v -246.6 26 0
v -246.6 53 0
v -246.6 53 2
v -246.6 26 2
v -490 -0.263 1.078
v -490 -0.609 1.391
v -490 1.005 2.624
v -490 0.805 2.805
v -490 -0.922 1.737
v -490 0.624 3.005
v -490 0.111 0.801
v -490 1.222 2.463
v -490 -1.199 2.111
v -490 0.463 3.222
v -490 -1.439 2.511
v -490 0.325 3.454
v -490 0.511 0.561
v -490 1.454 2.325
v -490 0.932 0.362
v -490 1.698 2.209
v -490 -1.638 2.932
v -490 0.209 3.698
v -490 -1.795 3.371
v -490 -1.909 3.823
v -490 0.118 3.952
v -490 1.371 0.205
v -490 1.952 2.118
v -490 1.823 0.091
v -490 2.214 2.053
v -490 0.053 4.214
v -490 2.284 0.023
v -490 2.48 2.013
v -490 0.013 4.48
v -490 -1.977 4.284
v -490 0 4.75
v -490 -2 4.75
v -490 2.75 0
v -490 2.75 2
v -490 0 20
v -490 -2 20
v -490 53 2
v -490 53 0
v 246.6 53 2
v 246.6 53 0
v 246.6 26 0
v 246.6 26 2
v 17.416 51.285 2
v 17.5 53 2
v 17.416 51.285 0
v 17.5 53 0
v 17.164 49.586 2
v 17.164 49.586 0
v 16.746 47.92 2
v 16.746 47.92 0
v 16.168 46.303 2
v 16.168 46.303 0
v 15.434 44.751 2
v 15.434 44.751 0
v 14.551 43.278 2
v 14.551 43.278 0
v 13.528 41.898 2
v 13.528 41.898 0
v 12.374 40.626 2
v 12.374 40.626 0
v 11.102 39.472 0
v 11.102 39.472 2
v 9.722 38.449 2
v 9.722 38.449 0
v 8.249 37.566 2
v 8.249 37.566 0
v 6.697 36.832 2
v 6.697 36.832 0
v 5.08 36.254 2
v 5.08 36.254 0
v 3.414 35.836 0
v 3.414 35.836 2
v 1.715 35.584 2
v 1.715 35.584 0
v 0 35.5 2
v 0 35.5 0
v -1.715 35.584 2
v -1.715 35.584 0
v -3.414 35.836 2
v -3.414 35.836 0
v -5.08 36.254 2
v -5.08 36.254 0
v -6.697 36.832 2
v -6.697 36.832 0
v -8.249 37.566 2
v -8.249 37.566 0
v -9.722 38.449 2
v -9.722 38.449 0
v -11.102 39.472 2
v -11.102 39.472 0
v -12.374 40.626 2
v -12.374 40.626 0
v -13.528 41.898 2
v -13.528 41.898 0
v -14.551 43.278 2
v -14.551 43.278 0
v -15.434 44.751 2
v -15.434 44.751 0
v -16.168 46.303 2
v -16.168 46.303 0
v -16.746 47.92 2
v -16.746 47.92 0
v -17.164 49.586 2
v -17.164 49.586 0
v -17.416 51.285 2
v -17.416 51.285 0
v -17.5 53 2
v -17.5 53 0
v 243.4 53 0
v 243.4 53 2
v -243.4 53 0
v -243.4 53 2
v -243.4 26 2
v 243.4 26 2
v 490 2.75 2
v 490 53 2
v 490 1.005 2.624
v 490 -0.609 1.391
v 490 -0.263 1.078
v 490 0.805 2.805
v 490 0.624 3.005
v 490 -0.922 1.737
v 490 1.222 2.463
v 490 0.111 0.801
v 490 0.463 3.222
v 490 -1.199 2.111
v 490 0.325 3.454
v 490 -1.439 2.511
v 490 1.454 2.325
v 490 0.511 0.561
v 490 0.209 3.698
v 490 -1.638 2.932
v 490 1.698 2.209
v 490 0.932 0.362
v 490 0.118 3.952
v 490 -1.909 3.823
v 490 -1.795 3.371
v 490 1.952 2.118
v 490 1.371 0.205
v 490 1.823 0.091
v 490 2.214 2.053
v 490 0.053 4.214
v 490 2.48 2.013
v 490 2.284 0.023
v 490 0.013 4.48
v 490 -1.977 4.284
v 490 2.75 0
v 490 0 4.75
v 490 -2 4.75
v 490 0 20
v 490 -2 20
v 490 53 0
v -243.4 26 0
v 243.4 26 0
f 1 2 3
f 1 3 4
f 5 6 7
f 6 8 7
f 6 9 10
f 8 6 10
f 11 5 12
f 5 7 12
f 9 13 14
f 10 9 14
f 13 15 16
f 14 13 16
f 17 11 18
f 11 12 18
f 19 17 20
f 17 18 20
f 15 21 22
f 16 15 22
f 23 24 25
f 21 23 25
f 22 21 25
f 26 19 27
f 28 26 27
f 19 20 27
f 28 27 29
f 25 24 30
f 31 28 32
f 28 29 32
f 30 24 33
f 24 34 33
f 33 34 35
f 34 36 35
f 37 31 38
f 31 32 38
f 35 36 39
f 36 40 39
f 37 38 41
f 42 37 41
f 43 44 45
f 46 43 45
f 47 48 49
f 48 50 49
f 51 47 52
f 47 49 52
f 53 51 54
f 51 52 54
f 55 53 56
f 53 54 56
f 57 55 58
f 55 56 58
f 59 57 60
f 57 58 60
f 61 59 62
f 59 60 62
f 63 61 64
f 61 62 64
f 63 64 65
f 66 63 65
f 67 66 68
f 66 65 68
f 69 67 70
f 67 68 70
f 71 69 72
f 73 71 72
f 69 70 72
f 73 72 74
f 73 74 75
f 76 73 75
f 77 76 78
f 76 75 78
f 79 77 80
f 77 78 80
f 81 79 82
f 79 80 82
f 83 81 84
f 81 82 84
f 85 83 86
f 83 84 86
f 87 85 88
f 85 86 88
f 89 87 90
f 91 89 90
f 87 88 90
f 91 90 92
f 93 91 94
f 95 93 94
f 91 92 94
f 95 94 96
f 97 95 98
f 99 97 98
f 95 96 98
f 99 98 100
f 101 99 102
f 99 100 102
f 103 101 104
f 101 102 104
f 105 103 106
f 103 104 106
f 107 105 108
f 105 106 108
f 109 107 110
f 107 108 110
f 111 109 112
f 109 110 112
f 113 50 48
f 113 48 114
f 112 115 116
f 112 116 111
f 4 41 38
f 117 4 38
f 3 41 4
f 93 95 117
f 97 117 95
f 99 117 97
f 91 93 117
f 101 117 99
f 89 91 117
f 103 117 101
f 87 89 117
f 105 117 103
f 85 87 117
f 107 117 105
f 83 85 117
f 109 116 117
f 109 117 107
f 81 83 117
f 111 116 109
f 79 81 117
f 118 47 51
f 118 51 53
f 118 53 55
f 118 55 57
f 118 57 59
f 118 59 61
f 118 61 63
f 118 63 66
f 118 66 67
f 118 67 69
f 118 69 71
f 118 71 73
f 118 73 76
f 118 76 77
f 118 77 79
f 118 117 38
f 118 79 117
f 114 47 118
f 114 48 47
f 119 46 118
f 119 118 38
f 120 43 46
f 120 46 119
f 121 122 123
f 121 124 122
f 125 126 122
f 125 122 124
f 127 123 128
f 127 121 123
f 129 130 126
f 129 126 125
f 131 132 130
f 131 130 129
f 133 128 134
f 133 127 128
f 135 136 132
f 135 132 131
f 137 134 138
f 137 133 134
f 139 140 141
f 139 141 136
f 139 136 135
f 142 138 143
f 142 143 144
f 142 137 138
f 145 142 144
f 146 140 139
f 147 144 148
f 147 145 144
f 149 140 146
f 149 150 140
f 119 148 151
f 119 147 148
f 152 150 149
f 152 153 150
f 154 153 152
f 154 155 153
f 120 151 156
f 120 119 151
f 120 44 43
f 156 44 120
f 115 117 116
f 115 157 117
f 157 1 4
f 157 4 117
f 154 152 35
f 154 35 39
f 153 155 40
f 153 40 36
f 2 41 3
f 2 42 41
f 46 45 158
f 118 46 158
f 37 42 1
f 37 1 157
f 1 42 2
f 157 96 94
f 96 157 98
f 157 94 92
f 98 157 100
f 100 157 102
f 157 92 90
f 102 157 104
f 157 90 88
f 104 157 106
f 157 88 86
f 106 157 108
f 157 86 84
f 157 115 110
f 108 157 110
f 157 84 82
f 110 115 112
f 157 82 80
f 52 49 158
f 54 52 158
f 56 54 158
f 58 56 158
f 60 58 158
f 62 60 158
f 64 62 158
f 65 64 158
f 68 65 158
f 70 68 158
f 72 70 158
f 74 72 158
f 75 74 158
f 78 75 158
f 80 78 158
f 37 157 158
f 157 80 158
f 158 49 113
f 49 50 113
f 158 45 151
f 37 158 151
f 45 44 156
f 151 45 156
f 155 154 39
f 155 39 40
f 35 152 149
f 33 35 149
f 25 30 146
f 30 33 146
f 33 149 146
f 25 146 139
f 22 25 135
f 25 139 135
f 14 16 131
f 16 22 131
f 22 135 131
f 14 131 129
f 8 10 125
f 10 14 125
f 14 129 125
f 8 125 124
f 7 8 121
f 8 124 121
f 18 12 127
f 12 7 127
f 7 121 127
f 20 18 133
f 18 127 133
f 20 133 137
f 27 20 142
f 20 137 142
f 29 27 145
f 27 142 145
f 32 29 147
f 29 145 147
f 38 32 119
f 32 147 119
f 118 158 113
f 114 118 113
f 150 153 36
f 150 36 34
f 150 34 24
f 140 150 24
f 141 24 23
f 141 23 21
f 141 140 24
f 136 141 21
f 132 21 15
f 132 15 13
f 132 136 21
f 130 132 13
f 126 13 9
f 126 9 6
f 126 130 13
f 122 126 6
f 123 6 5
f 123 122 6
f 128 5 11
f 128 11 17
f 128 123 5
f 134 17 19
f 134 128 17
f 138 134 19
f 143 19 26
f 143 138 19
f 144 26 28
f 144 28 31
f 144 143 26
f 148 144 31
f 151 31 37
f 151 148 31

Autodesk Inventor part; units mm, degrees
ref_plane "YZ Plane" through (0, 0, 0) normal (1, 0, 0) x (0, 1, 0)
ref_plane "XZ Plane" through (0, 0, 0) normal (0, 1, 0) x (-1, 0, 0)
ref_plane "XY Plane" through (0, 0, 0) normal (0, 0, 1) x (1, 0, 0)
sketch "Sketch1" plane through (0, 0, 0) normal (0, 0, 1) x (1, 0, 0)
  line L0 (-490, 53) -> (490, 53)
  line L1 (490, 53) -> (490, 0)
  line L2 (490, 0) -> (-490, 0)
  line L3 (-490, 0) -> (-490, 53)
  point P0 (0, 0)
  point P1 (0, 0)
  dimension "d0" = 980
  dimension "d1" = 53
extrude "Plate1" add sketch "Sketch1" along normal blind 2
sketch "Sketch2" plane through (490, -2, 0) normal (0, 1, 0) x (-1, 0, 0)
  line L0 (980, 0) -> (0, 0)
  line L1 (0, 0) -> (0, 20)
  line L2 (0, 20) -> (980, 20)
  line L3 (980, 20) -> (980, 0)
edge flange "Flange1" height 20 angle 90 thickness 2 bend radius 2.75 thickness toward (0, 1, 0) relief round relief width 2 relief depth 1 edges at (0, 0, 2) wall of the first edge with corners at (-490, -2, 0) (490, -2, 0) (490, -2, 20) (-490, -2, 20)
bend "Bend1"
corner "Corner1"
sketch "Sketch5" plane through (0, 0, 0) normal (0, 0, -1) x (-1, 0, 0)
  line L0 (490, 53) -> (-490, 53) projected
  line L1 (490, -2) -> (-490, -2) projected
  circle A0 centre (0, 53) radius 17.5
  line L2 (243.4, 53) -> (246.6, 53)
  line L3 (246.6, 53) -> (246.6, 26)
  line L4 (246.6, 26) -> (243.4, 26)
  line L5 (243.4, 26) -> (243.4, 53)
  line L6 (-243.4, 53) -> (-246.6, 53)
  line L7 (-246.6, 53) -> (-246.6, 26)
  line L8 (-246.6, 26) -> (-243.4, 26)
  line L9 (-243.4, 26) -> (-243.4, 53)
  line L10 (0, 53) -> (0, -2) construction
  point P0 (0, 0)
  point P1 (-490, -2)
  point P2 (245, 26)
  point P3 (-245, 26)
  point P4 (246.6, 53)
  point P5 (-17.5, 53)
  point P6 (17.5, 53)
  point P7 (-246.6, 53)
  dimension "d45" = 35
  dimension "d48" = 3.2
  dimension "d49" = 490
  dimension "d51" = 28
  dimension "d52" = 27
extrude "Extrusion1" cut sketch "Sketch5" against normal through all contours L3 L4 L5 L0 | L9 L8 L7 L0 | A0 L0 picked at (-2.238, 46.1497)
sketch "Sketch9" plane through (0, 0, 2) normal (0, 0, 1) x (1, 0, 0)
  line L0 (485.6141, 29.596) -> (485.6141, 17.596) construction
  line L1 (485.6141, 17.596) -> (285.6141, 17.596) construction
  line L2 (285.6141, 17.596) -> (285.6141, 29.596) construction
  line L3 (285.6141, 29.596) -> (485.6141, 29.596) construction
  line L4 (-490, 53) -> (490, 53) projected
  point P0 (0, 0)
  point P1 (1.05, 68)
  point P2 (490, 53)
  dimension "d40" = 200
  dimension "d41" = 12
mark "Mark2"
equation "\"d2\" = Thickness"
equation "\"d3\" = BendReliefWidth"
equation "\"d4\" = BendReliefDepth"
equation "\"d5\" = MinimumRemnant"
equation "\"d6\" = TransitionRadius"
equation "\"d9\" = BendRadius"
equation "\"d10\" = CornerReliefSize"
equation "\"d11\" = GapSize"
equation "\"d12\" = JacobiRadiusSize"
equation "\"BendReliefWidth\" = Thickness"
equation "\"BendReliefDepth\" = 0.5 * Thickness"
equation "\"CornerReliefSize\" = 4 * Thickness"
equation "\"MinimumRemnant\" = 2 * Thickness"
equation "\"TransitionRadius\" = BendRadius"
equation "\"JacobiRadiusSize\" = BendRadius"
equation "\"GapSize\" = Thickness"
equation "\"Thickness\" = 2"
equation "\"BendRadius\" = 2.75"
properties part number "MSC 343 stringer BOARD  ###" material "Stainless Steel"
